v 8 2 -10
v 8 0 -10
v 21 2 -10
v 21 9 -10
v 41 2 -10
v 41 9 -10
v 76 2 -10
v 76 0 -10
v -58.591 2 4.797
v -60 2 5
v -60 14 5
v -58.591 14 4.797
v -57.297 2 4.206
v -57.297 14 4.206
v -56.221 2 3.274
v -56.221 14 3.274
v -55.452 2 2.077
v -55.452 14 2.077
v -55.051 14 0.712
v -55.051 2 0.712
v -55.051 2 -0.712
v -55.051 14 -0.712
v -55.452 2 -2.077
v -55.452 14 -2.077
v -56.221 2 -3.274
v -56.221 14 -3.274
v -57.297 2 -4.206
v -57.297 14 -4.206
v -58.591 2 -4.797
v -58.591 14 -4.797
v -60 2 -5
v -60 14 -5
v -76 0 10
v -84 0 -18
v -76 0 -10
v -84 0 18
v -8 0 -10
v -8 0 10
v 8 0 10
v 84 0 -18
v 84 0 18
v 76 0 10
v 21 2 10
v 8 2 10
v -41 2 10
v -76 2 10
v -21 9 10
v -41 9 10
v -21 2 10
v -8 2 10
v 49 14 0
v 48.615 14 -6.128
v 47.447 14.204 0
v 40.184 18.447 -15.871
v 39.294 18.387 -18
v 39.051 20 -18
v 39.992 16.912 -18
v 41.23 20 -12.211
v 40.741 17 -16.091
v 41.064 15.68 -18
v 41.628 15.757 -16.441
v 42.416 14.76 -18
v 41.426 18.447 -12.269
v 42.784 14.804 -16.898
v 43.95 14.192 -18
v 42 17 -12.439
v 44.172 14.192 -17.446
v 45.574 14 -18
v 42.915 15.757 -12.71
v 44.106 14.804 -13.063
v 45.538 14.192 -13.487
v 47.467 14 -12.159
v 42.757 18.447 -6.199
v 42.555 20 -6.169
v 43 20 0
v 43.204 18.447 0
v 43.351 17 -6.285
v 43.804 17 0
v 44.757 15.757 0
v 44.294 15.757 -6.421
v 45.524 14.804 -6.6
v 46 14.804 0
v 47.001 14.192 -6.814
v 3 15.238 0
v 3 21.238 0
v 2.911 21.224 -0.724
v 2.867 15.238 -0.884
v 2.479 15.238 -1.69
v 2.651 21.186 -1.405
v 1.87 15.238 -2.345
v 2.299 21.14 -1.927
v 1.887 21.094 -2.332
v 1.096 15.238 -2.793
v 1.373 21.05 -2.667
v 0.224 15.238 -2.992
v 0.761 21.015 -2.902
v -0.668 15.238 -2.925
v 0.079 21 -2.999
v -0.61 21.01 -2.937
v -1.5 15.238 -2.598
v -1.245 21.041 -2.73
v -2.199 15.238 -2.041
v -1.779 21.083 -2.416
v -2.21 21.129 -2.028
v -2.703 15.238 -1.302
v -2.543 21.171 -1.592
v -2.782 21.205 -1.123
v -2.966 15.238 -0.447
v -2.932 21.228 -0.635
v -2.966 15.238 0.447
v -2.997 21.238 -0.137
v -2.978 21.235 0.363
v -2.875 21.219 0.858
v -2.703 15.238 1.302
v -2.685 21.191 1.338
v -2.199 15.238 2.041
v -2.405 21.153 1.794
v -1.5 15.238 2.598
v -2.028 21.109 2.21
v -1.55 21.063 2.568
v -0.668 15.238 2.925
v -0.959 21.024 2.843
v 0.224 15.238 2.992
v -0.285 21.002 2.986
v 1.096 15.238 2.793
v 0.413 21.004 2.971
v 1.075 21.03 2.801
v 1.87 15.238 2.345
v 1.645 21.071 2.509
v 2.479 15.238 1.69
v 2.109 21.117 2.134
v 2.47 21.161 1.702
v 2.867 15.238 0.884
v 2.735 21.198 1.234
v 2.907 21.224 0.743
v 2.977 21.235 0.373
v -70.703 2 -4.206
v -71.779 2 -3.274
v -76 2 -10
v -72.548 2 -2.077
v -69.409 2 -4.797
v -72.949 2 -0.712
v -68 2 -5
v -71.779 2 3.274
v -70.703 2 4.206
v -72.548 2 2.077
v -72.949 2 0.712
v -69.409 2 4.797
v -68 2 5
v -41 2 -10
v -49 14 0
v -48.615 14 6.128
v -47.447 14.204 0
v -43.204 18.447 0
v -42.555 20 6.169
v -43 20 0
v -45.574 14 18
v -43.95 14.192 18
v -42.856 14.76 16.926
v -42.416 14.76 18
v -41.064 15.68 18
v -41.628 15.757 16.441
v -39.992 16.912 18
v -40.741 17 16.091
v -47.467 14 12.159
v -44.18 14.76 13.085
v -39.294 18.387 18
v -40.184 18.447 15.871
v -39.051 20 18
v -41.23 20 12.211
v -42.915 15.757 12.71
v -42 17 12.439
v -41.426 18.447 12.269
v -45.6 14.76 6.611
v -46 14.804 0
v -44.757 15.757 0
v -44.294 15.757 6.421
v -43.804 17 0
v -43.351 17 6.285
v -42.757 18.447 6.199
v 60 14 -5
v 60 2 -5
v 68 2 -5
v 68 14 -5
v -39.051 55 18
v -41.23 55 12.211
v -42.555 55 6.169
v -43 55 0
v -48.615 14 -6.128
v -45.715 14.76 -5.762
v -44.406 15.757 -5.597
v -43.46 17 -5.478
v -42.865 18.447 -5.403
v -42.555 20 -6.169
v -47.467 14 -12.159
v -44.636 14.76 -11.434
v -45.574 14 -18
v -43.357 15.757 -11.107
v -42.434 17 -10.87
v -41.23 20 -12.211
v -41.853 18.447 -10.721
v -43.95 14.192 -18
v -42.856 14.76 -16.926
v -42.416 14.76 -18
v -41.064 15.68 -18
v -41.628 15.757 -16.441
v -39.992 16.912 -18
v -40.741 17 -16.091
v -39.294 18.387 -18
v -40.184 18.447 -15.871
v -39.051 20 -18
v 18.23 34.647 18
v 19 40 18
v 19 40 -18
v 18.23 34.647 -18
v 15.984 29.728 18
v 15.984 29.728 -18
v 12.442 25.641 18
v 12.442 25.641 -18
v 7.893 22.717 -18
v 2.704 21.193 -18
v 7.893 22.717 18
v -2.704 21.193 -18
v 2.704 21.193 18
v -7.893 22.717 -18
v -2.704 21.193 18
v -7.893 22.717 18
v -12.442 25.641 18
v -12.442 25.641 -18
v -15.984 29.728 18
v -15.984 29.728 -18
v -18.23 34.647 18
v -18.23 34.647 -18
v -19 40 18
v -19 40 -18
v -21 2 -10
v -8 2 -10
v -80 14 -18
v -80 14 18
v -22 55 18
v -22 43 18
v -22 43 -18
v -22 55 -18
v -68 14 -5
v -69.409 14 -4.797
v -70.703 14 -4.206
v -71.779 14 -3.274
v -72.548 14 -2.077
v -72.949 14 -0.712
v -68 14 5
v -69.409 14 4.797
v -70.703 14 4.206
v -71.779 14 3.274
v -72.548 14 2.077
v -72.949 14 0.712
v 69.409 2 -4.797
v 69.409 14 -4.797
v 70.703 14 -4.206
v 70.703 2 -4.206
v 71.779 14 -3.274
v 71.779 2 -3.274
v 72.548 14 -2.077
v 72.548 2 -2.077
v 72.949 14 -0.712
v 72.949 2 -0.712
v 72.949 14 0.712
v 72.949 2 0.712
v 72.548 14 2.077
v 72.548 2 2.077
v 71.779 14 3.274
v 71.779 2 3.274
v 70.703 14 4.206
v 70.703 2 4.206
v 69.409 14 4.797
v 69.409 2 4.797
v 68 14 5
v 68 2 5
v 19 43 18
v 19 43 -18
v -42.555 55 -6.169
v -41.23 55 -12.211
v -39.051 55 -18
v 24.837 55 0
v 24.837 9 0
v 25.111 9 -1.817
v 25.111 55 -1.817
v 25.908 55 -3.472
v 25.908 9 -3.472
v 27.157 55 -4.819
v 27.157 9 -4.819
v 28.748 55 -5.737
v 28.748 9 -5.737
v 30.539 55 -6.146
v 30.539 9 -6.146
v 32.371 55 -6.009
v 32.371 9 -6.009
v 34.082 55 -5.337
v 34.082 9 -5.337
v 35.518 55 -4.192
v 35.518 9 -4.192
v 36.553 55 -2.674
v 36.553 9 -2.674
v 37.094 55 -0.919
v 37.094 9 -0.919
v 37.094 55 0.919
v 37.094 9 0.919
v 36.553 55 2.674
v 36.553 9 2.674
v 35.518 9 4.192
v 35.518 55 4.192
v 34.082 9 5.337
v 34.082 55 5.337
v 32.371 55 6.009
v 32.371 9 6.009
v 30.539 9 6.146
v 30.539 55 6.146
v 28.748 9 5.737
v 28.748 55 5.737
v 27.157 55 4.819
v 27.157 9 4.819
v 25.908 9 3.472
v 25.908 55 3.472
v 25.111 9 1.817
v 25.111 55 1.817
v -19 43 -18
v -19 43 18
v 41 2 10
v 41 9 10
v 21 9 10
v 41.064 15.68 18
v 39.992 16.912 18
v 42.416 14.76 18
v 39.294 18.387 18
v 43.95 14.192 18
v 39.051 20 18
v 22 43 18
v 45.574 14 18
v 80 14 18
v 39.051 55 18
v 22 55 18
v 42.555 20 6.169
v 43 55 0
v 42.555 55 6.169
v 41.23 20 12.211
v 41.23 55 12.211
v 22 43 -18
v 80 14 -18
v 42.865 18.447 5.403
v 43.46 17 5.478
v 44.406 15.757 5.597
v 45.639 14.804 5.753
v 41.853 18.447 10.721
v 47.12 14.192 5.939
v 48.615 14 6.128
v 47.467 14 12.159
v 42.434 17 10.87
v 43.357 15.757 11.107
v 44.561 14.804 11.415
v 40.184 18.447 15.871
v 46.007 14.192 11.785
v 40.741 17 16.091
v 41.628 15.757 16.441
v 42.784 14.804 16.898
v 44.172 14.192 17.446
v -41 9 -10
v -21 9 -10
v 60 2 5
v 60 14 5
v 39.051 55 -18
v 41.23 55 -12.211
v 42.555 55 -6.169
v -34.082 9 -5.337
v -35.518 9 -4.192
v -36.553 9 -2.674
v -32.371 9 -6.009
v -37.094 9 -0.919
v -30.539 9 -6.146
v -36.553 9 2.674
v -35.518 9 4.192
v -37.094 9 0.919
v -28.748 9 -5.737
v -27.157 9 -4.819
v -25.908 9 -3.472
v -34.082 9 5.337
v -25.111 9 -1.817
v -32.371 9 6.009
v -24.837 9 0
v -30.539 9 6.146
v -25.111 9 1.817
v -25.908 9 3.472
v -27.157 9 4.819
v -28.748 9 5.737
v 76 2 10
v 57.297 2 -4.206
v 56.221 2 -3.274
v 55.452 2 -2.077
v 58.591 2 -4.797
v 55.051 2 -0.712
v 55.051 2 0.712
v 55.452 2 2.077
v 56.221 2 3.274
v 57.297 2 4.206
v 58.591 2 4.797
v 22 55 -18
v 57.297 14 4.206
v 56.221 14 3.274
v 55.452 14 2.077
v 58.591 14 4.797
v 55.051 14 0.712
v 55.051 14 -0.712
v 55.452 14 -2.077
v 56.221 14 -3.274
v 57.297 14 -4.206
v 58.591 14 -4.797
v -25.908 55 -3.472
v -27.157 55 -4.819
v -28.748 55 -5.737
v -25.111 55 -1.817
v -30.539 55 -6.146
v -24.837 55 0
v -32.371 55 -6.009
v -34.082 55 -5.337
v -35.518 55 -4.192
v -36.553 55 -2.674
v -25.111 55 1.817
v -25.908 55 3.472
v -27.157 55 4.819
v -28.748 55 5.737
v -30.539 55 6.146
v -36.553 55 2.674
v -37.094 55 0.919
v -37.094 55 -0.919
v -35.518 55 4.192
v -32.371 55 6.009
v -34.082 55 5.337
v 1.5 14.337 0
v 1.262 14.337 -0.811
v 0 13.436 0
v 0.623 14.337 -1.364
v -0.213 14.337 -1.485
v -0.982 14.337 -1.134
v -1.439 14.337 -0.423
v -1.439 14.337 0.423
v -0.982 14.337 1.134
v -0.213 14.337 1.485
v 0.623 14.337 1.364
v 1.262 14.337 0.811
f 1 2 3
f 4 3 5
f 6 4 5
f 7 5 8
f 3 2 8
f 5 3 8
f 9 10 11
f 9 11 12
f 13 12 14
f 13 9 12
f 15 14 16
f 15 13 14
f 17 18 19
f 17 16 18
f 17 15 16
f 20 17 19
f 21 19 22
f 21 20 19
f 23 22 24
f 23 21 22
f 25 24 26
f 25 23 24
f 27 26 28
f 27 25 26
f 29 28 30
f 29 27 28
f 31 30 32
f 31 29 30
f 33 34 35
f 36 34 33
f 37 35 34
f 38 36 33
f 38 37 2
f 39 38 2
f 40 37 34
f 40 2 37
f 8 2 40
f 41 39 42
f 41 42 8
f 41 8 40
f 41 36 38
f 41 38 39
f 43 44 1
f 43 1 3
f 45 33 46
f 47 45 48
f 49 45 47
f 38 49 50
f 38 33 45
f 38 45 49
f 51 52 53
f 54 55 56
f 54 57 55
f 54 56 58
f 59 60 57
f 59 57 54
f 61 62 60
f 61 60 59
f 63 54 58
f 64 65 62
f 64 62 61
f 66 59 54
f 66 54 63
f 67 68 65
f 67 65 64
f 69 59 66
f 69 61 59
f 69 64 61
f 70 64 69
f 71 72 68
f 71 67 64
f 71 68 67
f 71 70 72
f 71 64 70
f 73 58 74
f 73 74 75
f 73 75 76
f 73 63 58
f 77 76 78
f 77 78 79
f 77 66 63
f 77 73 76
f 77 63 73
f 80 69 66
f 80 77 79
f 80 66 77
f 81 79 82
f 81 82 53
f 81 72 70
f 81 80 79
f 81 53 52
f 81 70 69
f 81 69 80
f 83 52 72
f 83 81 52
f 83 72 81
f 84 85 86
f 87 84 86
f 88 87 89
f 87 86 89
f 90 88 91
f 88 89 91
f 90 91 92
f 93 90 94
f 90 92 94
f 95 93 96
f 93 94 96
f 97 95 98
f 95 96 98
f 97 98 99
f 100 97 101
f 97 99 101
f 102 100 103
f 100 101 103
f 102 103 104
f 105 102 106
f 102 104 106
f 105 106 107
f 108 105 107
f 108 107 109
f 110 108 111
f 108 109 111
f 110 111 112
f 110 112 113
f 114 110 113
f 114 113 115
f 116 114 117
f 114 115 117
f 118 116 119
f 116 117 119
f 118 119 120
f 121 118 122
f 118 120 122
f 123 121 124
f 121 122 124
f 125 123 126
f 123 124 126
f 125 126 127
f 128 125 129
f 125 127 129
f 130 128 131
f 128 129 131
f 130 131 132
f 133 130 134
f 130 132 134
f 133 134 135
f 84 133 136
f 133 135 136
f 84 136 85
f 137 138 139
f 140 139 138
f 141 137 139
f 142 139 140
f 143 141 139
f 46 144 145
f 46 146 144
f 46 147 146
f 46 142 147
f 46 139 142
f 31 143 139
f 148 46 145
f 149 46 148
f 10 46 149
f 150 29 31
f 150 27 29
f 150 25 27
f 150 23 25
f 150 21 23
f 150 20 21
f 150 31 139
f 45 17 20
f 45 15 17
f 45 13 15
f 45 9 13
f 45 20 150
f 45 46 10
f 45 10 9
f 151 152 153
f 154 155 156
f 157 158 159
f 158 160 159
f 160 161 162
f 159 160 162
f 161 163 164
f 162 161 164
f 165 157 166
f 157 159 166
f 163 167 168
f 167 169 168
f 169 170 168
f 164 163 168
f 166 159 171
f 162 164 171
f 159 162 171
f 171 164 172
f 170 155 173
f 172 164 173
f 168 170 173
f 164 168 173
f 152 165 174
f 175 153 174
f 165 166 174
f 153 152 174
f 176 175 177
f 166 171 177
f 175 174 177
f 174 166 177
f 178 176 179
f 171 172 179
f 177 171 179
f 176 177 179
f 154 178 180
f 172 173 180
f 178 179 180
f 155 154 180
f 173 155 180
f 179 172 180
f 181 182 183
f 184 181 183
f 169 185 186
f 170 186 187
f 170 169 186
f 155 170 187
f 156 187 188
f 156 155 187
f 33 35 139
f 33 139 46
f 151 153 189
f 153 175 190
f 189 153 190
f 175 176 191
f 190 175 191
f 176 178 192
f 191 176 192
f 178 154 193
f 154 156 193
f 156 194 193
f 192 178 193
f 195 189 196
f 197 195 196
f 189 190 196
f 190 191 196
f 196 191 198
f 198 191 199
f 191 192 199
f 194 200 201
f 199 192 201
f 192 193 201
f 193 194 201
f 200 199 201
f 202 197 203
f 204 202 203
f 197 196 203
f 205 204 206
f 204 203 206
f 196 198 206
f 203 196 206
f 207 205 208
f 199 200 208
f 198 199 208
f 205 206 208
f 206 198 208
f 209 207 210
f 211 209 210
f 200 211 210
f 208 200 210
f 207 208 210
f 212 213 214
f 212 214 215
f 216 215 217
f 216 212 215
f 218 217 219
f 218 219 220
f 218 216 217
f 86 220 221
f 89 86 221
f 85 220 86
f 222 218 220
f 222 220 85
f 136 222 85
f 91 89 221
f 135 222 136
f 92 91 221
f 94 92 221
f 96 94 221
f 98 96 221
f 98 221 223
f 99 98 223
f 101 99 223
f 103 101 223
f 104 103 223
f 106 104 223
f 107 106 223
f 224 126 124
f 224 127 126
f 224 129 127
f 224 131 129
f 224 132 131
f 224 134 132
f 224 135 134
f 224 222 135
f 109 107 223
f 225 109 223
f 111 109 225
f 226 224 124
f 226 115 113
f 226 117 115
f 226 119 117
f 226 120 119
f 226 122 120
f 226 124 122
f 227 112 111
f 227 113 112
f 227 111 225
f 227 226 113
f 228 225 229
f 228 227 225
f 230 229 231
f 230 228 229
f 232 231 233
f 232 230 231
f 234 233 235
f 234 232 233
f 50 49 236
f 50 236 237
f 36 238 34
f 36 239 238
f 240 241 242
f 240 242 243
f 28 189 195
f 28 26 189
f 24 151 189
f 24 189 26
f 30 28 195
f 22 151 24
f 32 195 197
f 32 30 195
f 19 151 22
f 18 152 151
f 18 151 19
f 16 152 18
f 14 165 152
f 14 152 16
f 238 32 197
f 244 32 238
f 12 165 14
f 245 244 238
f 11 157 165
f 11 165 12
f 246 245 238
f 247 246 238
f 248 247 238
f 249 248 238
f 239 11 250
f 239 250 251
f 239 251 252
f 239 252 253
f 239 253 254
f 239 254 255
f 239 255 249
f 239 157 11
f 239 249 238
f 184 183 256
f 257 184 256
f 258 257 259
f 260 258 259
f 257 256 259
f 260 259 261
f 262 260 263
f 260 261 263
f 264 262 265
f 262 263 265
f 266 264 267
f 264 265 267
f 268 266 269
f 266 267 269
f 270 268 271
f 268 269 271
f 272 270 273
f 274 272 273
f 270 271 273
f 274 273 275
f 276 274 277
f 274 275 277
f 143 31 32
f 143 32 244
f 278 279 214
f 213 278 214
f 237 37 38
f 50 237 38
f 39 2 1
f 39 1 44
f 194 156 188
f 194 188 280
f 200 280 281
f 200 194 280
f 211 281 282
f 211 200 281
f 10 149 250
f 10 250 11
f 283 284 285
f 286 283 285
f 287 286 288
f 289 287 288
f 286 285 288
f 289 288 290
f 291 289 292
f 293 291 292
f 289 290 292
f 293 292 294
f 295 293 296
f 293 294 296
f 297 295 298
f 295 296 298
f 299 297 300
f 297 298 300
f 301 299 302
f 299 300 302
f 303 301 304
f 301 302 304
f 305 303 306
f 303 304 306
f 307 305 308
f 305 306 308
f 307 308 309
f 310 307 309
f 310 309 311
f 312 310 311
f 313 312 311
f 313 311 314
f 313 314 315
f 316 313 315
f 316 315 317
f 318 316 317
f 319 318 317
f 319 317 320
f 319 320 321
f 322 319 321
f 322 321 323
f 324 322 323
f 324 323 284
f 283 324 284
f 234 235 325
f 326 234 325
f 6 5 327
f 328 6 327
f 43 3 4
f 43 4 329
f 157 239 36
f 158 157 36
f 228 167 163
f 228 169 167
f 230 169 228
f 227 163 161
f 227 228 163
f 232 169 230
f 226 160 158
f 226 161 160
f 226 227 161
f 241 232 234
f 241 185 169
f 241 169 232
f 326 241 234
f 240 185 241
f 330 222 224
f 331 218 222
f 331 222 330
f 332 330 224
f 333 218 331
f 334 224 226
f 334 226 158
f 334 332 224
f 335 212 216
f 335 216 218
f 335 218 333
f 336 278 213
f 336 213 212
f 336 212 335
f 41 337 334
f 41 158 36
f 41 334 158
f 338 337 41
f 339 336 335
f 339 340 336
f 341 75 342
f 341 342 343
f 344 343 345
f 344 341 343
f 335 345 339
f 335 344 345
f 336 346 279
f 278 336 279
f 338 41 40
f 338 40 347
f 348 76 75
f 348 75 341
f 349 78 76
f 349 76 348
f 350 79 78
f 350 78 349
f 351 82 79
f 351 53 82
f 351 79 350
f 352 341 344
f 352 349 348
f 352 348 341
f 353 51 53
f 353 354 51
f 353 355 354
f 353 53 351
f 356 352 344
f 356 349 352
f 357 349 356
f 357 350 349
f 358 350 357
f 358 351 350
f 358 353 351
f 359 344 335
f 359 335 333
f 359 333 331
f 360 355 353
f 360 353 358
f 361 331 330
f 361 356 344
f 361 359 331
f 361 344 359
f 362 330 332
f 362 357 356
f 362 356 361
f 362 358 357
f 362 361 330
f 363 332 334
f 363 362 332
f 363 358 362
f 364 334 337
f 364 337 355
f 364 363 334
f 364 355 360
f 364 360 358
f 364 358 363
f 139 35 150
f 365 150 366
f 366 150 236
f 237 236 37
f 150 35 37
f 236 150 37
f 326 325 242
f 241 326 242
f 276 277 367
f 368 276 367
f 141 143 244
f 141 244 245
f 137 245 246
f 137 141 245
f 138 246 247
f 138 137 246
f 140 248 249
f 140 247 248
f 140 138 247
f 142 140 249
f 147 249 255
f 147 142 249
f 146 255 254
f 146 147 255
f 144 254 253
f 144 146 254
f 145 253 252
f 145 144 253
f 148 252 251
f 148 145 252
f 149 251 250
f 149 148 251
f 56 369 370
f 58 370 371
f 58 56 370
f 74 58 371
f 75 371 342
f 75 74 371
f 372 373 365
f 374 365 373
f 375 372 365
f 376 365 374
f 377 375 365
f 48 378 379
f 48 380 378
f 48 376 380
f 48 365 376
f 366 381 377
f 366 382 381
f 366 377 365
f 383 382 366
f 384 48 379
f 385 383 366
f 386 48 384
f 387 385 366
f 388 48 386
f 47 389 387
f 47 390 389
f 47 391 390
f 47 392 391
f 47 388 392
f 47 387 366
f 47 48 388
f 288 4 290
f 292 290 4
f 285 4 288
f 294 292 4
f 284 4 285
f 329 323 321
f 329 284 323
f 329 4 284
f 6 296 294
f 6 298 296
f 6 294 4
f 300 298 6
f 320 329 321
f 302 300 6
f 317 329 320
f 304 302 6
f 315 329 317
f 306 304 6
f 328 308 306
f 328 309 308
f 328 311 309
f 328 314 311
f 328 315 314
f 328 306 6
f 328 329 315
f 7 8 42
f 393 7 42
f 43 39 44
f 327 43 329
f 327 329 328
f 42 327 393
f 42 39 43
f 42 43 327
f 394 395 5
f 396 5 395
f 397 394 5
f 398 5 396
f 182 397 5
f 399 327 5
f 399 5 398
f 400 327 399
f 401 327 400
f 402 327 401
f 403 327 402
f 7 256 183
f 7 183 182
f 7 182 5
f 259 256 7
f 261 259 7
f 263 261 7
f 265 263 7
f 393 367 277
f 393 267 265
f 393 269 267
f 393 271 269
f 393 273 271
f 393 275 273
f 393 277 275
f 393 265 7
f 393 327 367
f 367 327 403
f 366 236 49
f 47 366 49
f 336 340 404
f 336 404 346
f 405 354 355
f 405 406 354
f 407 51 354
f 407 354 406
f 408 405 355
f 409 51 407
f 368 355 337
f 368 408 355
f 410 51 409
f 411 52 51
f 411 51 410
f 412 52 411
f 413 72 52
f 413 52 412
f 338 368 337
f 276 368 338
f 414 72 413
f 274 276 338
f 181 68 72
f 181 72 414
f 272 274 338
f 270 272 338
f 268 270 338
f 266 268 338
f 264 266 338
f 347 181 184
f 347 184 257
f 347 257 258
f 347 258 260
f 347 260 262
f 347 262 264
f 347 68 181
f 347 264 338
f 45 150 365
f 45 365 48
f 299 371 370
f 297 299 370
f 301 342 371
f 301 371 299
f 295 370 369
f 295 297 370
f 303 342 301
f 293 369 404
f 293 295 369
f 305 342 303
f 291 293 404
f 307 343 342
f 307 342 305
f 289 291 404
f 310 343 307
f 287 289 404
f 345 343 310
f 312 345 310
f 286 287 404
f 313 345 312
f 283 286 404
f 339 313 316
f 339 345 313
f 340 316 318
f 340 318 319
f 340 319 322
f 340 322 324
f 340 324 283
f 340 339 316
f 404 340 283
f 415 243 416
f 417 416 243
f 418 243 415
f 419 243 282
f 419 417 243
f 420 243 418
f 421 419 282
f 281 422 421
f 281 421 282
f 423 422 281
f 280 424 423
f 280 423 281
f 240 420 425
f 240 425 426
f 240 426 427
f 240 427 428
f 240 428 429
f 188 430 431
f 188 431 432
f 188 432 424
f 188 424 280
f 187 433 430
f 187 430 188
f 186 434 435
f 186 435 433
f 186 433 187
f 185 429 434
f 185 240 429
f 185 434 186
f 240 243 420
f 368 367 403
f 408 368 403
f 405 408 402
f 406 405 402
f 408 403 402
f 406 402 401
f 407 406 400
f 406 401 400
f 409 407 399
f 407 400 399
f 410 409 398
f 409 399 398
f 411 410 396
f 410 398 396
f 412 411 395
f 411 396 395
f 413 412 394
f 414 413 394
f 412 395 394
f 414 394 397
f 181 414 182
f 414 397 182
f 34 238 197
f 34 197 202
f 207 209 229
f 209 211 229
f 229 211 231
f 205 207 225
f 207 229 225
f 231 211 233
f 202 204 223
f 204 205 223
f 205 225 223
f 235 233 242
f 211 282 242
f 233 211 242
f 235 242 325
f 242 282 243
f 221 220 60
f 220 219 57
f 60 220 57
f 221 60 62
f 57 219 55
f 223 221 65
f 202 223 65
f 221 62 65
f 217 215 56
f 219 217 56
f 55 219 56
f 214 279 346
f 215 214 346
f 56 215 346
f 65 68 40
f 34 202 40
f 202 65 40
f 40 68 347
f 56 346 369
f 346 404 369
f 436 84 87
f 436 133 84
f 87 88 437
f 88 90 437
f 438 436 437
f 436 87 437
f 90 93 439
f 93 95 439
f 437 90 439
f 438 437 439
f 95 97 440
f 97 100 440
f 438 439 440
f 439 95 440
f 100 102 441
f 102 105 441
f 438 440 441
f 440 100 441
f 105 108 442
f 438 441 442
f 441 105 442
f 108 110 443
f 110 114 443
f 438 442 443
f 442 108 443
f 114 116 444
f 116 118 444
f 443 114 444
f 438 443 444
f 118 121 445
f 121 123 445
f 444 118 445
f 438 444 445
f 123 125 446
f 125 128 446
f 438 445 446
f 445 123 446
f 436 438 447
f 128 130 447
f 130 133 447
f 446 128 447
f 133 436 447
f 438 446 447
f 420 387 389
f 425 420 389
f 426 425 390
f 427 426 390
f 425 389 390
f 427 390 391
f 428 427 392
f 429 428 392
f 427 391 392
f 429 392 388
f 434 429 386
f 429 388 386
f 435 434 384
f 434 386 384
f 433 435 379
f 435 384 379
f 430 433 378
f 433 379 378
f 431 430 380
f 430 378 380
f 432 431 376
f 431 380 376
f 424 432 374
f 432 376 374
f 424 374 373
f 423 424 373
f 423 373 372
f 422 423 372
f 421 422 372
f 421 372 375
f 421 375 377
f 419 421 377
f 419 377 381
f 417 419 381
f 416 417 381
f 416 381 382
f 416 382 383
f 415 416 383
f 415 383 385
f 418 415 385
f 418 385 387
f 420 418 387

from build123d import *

# Parameters (mm, degrees)
BOSS_EXTRUDE1_DEPTH = 18
SKETCH2_W           = 68
SKETCH2_H           = 20
CUT_EXTRUDE2_DEPTH  = 2
SKETCH4_W           = 20
SKETCH4_H           = 20
CUT_EXTRUDE3_DEPTH  = 7
SKETCH5_R           = 6.163168956
CUT_EXTRUDE4_DEPTH  = 103.004901843
CUT_EXTRUDE5_START  = -41
CUT_EXTRUDE5_DEPTH  = 41
FILLET1_R           = 6


with BuildPart() as part:
    # Sketch1 → Boss-Extrude1 (new, symmetric)
    with BuildSketch(Plane.XY):
        with BuildLine():
            Line((-84, 0), (84, 0))
            Line((84, 0), (80, 14))
            Line((80, 14), (43, 14))
            Line((43, 14), (43, 55))
            Line((43, 55), (22, 55))
            Line((22, 55), (22, 43))
            Line((22, 43), (19, 43))
            Line((19, 43), (19, 40))
            ThreePointArc((19, 40), (0, 21), (-19, 40))
            Line((-19, 40), (-19, 43))
            Line((-19, 43), (-22, 43))
            Line((-22, 43), (-22, 55))
            Line((-22, 55), (-43, 55))
            Line((-43, 55), (-43, 14))
            Line((-43, 14), (-80, 14))
            Line((-80, 14), (-84, 0))
        make_face()
    extrude(amount=BOSS_EXTRUDE1_DEPTH, both=True)

    # Sketch2 → Cut-Extrude2 (cut)
    with BuildSketch(Plane.XZ):
        with Locations((-42, 0)):
            Rectangle(SKETCH2_W, SKETCH2_H)
        with Locations((42, 0)):
            Rectangle(SKETCH2_W, SKETCH2_H)
    extrude(amount=-CUT_EXTRUDE2_DEPTH, mode=Mode.SUBTRACT)

    # Sketch4 → Cut-Extrude3 (cut)
    with BuildSketch(Plane.XZ.offset(-2)):
        with Locations((-31, 0)):
            Rectangle(SKETCH4_W, SKETCH4_H)
        with Locations((31, 0)):
            Rectangle(SKETCH4_W, SKETCH4_H)
    extrude(amount=-CUT_EXTRUDE3_DEPTH, mode=Mode.SUBTRACT)

    # Sketch5 → Cut-Extrude4 (cut, through all)
    with BuildSketch(Plane.XZ):
        with Locations((-31, 0)):
            Circle(SKETCH5_R)
        with Locations(Location((31, 0, 0), (0, 0, 180))):
            Circle(SKETCH5_R)
        with BuildLine():
            Line((-68, 5), (-60, 5))
            ThreePointArc((-60, 5), (-55, 0), (-60, -5))
            Line((-60, -5), (-68, -5))
            ThreePointArc((-68, -5), (-73, 0), (-68, 5))
        make_face()
        with BuildLine():
            Line((68, 5), (60, 5))
            ThreePointArc((60, 5), (55, 0), (60, -5))
            Line((60, -5), (68, -5))
            ThreePointArc((68, -5), (73, 0), (68, 5))
        make_face()
    extrude(amount=-CUT_EXTRUDE4_DEPTH, mode=Mode.SUBTRACT)

    # Cut-Extrude5: read off the stored shape, not the designer's step
    # Cut-Extrude5 outline → Cut-Extrude5 (cut)
    with BuildSketch(Plane(origin=(0, 55, 0), x_dir=(1, 0, 0), z_dir=(0, 1, 0)).offset(CUT_EXTRUDE5_START)):
        with BuildLine():
            ThreePointArc((-43, 0), (-42.001212365, 9.214019744), (-39.05124838, 18))
            Line((-39.05124838, 18), (-43, 18))
            Line((-43, 18), (-43, 0))
        make_face()
        with BuildLine():
            ThreePointArc((-39.05124838, -18), (-42.001212365, -9.214019744), (-43, 0))
            Line((-43, 0), (-43, -18))
            Line((-43, -18), (-39.05124838, -18))
        make_face()
        with BuildLine():
            Line((43, 18), (39.05124838, 18))
            ThreePointArc((39.05124838, 18), (42.001212365, 9.214019744), (43, 0))
            Line((43, 0), (43, 18))
        make_face()
        with BuildLine():
            Line((43, -18), (43, 0))
            ThreePointArc((43, 0), (42.001212365, -9.214019744), (39.05124838, -18))
            Line((39.05124838, -18), (43, -18))
        make_face()
    extrude(amount=CUT_EXTRUDE5_DEPTH, mode=Mode.SUBTRACT)

    # Fillet1
    fillet1_edges = [part.edges().sort_by_distance(p)[0] for p in [
        (-42.001212365, 14, 9.214019744),
        (42.001212365, 14, -9.214019744),
    ]]
    fillet(fillet1_edges, radius=FILLET1_R)

    # Cut-Revolve1: read off the stored shape, not the designer's step
    # Cut-Revolve1 outline → Cut-Revolve1 (revolve, cut)
    with BuildSketch(Plane.XY):
        Polygon((0, 13.435755104), (3, 15.238336961), (3, 21.238467133), (0, 21.238467133), align=None)
    revolve(axis=Axis((0, 0, 0), (0, 1, 0)), mode=Mode.SUBTRACT)


solid = part.part
